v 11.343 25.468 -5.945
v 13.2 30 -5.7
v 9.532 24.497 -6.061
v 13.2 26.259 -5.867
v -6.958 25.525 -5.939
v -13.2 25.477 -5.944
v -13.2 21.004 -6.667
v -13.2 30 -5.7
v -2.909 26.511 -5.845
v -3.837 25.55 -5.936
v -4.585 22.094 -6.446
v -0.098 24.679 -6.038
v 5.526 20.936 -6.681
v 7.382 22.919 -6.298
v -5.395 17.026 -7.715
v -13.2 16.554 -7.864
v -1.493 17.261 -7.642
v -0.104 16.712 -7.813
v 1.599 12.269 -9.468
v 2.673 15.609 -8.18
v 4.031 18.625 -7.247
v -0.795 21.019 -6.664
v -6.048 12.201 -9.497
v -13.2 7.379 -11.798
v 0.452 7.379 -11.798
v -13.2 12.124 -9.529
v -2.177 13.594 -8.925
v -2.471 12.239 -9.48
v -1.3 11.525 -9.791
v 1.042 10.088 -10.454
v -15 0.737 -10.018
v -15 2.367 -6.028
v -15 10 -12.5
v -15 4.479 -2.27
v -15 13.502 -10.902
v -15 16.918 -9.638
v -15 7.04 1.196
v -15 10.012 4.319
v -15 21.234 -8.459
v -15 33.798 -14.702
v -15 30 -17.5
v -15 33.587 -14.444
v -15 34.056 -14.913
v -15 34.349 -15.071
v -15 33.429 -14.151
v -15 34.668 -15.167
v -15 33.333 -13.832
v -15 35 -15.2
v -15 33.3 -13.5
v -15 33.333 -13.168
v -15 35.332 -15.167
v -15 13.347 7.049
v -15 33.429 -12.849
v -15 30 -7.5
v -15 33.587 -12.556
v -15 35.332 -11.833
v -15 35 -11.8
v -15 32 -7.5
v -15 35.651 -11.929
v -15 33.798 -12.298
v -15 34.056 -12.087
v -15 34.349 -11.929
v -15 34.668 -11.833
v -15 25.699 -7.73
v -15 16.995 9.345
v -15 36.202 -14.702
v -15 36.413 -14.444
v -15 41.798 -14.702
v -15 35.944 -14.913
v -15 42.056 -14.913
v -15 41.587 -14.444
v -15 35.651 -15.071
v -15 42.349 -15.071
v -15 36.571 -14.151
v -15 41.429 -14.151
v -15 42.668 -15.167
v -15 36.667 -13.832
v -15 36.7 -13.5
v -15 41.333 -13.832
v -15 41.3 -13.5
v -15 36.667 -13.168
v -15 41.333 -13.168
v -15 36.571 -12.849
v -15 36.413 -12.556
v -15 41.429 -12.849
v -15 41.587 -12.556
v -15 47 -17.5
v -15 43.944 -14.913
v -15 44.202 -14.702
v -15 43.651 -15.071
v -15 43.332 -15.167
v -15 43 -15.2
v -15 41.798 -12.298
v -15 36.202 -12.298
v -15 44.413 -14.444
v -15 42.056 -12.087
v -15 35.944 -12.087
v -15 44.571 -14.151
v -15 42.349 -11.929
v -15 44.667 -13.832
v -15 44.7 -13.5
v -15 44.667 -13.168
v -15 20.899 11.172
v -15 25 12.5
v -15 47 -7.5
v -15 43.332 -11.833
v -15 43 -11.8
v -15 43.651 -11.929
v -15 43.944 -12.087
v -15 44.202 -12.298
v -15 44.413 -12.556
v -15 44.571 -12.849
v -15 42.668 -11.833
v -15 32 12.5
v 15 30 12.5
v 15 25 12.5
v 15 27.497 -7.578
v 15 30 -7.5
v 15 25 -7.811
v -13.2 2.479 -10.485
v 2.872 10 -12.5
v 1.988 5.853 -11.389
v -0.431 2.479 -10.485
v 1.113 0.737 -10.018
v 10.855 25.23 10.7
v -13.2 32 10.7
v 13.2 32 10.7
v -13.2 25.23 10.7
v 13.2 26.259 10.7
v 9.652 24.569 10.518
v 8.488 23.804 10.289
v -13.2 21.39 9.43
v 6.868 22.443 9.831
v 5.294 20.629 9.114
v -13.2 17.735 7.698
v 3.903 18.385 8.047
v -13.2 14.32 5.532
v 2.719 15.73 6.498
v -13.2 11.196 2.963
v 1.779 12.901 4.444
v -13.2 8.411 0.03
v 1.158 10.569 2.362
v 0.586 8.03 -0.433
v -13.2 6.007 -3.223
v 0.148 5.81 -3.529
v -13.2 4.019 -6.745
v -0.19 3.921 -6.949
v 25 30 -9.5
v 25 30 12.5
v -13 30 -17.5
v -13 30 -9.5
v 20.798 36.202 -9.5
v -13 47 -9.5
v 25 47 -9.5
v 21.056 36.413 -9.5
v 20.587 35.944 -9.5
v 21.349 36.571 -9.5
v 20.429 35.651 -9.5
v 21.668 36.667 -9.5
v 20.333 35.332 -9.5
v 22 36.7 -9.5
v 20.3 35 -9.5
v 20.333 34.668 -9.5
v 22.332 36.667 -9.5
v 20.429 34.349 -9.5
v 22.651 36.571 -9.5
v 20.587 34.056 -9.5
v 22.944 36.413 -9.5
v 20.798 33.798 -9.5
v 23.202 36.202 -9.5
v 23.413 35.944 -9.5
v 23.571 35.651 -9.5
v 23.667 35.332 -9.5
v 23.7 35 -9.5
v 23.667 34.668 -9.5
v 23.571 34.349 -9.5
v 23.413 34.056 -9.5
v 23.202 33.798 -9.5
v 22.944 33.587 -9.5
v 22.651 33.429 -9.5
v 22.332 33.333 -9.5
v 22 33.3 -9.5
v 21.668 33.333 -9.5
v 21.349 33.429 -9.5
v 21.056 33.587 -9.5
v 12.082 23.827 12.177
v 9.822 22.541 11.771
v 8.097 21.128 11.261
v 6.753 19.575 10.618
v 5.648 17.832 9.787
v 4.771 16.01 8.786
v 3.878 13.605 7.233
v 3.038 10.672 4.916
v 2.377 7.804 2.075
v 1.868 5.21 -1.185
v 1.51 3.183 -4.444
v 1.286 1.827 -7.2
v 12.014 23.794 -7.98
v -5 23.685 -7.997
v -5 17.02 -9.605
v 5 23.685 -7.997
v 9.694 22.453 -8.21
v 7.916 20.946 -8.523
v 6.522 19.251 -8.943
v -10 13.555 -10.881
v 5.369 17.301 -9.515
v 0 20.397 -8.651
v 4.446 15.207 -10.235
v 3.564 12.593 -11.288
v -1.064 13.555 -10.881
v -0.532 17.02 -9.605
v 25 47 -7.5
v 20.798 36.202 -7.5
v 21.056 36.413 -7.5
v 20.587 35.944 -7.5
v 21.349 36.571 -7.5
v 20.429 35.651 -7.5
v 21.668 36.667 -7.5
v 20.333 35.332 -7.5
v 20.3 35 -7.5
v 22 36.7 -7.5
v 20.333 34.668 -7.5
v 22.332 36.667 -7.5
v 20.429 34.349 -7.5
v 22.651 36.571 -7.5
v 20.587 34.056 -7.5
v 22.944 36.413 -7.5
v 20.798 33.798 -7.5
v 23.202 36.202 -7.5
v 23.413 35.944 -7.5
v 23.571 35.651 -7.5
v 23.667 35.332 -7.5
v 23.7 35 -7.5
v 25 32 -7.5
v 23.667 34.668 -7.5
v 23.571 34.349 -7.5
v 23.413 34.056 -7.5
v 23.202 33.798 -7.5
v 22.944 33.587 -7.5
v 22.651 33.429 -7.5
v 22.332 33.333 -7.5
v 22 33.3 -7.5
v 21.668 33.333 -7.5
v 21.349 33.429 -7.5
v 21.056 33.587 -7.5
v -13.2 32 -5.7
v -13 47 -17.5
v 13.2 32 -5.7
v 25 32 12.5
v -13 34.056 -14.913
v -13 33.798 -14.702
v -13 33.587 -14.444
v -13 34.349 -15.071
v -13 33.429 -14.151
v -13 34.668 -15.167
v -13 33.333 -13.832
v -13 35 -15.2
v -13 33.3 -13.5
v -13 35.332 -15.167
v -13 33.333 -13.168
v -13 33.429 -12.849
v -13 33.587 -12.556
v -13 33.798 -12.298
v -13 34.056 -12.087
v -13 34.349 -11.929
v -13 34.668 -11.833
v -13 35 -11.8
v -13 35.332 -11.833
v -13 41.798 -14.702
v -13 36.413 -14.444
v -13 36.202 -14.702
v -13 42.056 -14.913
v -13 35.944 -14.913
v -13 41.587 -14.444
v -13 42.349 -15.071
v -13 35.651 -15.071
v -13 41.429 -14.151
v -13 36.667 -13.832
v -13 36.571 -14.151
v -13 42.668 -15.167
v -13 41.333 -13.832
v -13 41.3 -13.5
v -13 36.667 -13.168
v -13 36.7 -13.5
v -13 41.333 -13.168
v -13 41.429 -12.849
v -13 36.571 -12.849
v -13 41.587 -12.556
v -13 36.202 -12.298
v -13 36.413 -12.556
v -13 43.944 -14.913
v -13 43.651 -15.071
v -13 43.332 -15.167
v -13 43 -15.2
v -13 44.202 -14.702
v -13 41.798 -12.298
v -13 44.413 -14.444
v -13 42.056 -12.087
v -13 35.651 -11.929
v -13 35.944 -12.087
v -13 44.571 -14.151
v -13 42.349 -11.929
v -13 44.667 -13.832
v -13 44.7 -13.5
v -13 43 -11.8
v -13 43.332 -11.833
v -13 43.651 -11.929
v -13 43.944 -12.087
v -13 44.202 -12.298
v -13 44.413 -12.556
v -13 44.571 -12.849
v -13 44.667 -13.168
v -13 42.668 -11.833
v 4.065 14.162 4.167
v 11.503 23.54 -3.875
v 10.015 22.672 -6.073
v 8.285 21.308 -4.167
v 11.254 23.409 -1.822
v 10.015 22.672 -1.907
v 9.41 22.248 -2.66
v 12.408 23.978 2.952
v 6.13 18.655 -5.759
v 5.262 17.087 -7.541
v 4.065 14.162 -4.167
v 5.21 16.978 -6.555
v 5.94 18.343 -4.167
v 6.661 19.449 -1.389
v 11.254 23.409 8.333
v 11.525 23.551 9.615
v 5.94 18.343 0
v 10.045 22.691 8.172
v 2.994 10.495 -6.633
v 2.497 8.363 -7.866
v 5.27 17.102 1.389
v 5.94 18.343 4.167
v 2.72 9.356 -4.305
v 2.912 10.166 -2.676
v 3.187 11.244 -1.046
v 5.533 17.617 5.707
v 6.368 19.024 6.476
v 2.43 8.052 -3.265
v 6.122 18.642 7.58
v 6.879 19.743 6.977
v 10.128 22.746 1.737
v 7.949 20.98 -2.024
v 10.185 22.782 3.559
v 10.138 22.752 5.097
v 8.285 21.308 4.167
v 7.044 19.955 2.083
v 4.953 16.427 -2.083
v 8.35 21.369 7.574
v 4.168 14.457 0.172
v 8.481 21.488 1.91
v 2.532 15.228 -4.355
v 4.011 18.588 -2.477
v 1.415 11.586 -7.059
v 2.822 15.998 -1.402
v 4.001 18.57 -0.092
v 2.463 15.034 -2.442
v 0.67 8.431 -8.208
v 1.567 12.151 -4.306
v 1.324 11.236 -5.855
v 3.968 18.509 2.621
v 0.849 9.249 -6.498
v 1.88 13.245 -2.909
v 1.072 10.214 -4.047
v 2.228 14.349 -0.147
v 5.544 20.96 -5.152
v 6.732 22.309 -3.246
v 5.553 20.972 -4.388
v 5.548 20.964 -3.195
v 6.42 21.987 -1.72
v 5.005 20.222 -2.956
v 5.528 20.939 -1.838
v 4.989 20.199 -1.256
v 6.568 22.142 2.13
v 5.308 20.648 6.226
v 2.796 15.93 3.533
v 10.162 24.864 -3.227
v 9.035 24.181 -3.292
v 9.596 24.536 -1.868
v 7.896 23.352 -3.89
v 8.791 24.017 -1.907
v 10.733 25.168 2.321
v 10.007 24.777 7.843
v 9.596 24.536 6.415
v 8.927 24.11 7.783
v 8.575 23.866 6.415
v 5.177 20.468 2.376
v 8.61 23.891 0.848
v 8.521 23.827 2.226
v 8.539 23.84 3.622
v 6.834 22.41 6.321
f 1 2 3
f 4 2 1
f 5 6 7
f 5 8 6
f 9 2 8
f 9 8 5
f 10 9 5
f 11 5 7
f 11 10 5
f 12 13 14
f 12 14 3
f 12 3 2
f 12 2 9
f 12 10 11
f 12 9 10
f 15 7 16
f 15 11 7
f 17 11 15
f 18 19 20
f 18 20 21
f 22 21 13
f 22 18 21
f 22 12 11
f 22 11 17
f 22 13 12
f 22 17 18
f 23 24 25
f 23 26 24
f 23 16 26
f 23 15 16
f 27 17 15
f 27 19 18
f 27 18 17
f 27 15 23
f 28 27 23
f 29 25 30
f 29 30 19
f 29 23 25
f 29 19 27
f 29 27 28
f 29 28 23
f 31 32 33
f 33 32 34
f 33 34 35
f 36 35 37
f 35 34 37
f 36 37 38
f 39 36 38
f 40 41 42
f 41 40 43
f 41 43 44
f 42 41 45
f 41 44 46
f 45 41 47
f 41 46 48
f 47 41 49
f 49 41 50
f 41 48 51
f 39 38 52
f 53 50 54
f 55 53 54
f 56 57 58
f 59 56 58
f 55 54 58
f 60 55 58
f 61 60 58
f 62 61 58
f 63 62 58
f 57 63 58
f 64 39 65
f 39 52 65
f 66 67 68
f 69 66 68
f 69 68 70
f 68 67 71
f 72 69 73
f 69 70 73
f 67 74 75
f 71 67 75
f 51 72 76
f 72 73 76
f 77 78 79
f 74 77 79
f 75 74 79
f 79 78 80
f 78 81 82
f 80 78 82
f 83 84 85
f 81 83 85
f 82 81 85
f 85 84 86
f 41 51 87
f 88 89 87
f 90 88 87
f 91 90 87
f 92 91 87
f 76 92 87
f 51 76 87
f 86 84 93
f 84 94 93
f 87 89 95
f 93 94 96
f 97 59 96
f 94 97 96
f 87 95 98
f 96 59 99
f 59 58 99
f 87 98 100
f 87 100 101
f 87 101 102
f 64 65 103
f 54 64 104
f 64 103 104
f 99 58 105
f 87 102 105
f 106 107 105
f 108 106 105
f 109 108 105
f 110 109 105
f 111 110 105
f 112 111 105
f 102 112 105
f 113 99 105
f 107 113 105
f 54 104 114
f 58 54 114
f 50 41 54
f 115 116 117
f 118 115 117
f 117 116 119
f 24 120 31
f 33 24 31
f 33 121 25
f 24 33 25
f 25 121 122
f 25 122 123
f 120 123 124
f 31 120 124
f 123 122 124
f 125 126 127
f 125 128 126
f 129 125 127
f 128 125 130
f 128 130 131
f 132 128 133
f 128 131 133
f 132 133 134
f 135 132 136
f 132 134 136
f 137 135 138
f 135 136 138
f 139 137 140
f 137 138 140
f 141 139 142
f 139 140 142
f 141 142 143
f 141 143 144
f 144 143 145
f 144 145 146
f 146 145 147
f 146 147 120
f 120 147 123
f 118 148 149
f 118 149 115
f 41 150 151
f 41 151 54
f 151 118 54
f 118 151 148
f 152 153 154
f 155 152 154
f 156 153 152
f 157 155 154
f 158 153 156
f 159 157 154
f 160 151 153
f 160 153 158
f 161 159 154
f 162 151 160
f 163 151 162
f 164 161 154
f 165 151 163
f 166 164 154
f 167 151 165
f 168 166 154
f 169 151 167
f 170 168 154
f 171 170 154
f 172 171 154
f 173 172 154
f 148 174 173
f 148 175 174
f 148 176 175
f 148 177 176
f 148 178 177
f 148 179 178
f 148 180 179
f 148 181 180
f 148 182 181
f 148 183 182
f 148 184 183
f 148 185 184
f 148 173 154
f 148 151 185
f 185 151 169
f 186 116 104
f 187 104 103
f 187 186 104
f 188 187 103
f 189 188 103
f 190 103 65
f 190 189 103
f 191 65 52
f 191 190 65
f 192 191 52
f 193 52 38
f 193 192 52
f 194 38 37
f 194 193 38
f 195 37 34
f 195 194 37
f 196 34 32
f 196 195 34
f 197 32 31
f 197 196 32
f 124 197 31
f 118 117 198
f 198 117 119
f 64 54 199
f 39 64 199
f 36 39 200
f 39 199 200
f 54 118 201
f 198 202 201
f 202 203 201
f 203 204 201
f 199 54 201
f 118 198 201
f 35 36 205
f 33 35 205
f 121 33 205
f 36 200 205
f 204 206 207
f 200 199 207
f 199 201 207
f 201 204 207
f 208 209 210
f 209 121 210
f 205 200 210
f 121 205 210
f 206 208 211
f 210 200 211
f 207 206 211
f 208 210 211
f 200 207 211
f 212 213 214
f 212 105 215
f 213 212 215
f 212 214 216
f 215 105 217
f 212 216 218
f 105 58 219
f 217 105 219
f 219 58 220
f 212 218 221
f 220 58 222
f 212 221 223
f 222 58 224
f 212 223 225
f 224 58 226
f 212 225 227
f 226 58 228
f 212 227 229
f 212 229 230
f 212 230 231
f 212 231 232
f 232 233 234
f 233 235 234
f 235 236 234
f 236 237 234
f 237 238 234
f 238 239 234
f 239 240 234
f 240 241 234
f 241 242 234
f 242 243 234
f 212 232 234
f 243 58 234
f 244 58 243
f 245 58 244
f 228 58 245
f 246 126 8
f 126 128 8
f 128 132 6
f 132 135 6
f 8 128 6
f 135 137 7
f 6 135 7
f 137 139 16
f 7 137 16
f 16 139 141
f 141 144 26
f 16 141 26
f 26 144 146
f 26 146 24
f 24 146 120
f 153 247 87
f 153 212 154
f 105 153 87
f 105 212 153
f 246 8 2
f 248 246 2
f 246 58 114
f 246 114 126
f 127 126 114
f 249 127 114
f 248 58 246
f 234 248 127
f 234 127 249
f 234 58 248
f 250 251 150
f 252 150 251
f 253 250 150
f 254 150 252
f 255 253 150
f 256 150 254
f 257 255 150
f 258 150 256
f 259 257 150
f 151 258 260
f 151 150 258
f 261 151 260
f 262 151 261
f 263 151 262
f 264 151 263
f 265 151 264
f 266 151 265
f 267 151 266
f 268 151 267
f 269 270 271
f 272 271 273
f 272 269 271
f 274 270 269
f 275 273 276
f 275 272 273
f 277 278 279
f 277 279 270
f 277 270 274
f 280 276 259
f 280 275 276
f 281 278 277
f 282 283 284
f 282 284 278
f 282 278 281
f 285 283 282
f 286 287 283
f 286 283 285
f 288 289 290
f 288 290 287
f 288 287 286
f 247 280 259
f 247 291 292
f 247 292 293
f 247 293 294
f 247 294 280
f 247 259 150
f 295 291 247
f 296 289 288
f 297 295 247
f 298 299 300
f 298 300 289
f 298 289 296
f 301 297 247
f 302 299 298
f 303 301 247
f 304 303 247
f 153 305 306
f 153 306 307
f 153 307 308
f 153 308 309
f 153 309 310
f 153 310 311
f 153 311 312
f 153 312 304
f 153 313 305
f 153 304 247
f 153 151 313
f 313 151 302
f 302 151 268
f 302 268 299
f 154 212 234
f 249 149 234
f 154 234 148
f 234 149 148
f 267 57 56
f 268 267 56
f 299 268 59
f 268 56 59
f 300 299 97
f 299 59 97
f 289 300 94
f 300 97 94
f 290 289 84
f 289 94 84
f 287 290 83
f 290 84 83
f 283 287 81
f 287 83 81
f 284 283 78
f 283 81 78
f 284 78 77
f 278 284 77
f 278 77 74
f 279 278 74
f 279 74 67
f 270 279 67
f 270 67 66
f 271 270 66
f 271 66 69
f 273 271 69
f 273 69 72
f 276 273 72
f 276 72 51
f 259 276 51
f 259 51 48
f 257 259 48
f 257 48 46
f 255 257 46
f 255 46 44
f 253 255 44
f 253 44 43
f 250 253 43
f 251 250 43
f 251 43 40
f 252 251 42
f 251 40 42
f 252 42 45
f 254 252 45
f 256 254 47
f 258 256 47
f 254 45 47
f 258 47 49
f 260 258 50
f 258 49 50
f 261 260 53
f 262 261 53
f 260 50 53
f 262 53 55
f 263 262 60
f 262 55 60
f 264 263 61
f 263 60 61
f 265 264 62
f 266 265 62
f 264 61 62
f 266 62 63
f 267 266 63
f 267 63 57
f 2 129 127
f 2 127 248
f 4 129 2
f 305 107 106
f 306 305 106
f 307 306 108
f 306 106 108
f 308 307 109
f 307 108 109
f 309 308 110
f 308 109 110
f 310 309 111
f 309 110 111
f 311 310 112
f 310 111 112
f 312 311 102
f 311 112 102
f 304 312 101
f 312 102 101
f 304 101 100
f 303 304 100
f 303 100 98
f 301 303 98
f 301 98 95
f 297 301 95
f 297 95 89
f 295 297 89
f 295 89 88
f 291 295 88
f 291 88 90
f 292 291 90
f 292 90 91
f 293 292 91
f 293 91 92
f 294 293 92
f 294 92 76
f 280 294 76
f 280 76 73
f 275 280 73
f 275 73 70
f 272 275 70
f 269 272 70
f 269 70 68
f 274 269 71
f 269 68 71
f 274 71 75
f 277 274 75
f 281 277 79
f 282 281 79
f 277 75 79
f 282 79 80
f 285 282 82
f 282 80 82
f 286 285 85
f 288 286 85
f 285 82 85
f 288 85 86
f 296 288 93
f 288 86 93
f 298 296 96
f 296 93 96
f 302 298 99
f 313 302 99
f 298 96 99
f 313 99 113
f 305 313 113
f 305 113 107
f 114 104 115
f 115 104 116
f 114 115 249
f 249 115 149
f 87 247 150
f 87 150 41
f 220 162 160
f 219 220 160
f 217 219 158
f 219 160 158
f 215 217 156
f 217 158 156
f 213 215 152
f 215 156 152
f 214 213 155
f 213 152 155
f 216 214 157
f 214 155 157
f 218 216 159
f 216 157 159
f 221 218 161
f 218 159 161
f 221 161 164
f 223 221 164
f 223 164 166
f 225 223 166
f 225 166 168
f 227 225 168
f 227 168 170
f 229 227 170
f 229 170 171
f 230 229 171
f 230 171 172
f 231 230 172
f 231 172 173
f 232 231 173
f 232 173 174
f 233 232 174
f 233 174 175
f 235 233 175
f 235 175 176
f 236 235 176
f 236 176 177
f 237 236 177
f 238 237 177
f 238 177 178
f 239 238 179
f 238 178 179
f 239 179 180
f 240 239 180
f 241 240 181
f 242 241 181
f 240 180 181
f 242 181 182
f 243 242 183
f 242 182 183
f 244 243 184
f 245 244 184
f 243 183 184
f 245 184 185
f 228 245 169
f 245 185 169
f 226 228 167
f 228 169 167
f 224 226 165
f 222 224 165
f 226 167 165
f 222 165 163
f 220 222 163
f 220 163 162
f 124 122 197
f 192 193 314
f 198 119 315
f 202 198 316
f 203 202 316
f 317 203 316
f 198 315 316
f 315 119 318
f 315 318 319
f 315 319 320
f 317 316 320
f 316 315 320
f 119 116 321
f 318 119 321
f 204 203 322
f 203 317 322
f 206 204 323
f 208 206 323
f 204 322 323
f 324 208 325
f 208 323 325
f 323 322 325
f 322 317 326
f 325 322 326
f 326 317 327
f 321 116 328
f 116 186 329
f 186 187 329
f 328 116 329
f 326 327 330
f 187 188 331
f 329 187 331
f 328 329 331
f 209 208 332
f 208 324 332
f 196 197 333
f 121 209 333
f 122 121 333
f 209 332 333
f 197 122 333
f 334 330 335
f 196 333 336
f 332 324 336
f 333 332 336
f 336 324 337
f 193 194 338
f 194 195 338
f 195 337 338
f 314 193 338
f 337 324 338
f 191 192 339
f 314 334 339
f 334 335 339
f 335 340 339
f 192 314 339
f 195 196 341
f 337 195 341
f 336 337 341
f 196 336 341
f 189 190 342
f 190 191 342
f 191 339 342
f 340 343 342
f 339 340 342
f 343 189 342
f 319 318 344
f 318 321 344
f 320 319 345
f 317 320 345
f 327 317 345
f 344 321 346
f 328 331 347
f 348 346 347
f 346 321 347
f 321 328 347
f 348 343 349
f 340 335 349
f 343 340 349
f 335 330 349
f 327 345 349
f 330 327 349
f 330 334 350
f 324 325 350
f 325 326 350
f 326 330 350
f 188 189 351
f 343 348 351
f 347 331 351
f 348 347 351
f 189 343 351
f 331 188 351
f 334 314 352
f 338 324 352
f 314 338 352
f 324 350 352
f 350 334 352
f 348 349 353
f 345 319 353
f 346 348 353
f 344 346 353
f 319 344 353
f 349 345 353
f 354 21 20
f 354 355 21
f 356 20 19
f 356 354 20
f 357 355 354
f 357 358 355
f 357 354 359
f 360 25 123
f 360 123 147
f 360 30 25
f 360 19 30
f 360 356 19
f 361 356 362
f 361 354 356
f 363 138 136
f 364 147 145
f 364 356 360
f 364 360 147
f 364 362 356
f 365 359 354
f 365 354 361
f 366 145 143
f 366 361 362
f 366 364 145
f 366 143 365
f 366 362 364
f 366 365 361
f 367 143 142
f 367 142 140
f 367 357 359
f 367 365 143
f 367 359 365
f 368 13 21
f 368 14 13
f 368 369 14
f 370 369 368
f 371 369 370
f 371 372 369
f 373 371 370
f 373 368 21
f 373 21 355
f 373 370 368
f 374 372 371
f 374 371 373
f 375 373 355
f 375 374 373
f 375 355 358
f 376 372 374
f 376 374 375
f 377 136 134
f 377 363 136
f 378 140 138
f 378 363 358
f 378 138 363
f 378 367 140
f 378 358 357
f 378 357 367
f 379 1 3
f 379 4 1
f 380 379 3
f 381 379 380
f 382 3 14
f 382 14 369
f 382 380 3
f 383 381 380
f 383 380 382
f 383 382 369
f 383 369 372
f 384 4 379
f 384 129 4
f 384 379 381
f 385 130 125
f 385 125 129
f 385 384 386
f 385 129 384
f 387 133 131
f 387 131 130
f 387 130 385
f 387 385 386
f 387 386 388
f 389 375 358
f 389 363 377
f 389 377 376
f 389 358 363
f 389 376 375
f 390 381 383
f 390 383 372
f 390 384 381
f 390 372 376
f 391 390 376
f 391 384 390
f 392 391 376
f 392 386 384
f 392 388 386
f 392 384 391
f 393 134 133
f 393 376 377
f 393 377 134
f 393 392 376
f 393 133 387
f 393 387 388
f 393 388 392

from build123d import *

# Parameters (mm, degrees)
SKETCH_1_W               = 30
SKETCH_1_H               = 25
EXTRUDE_1_DEPTH          = 30
CUT_EXTRUDE_START        = -25
CUT_EXTRUDE_1_DEPTH      = 25
CUT_EXTRUDE_START_2      = -30
CUT_EXTRUDE_2_DEPTH      = 30
CUT_EXTRUDE_3_DEPTH      = 45.229515196
CUT_EXTRUDE_3_DEPTH_BACK = 45.229515196
CUT_EXTRUDE_4_DEPTH      = 45.229515196
CUT_EXTRUDE_4_DEPTH_BACK = 45.229515196
SHELL_2_T                = -1.8
SKETCH_8_W               = 40
SKETCH_8_H               = 20
SKETCH_8_W_2             = 26.4
SKETCH_8_H_2             = 16.4
EXTRUDE_2_DEPTH          = 2
EXTRUDE_3_DEPTH          = 15
EXTRUDE_3_DEPTH_BACK     = 2
SKETCH_9_W               = 40
SKETCH_9_H               = 2
SKETCH_10_W              = 2
SKETCH_10_H              = 17
EXTRUDE_4_DEPTH          = 8
CUT_EXTRUDE_5_REACH      = 66.15
SKETCH_13_R              = 1.7
CUT_EXTRUDE_6_REACH      = 59.602
SKETCH_14_R              = 1.7


# Read off the part's stored shape, not the designer's step: 切除-拉伸1, 切除-拉伸2
with BuildPart() as part:
    # 草图1 → 凸台-拉伸1 (new body)
    with BuildSketch(Plane(origin=(0, 0, 0), x_dir=(1, 0, 0), z_dir=(0, 1, 0))):
        Rectangle(SKETCH_1_W, SKETCH_1_H)
    extrude(amount=EXTRUDE_1_DEPTH)

    # 切除-拉伸1 outline → 切除-拉伸1 (cut)
    with BuildSketch(Plane(origin=(0, 0, -12.5), x_dir=(-1, 0, 0), z_dir=(0, 0, -1)).offset(CUT_EXTRUDE_START)):
        with BuildLine():
            add(Edge.make_bspline(
                [(-15, 25), (-6.511377405, 22.051776189), (-3.763777339, 18.136586702), (-1, 0)],
                knots=[0, 0, 0, 0, 1, 1, 1, 1], degree=3))
            Line((-15, 25), (-15, 0))
            Line((-15, 0), (-1, 0))
        make_face()
    extrude(amount=CUT_EXTRUDE_1_DEPTH, mode=Mode.SUBTRACT)

    # 切除-拉伸2 outline → 切除-拉伸2 (cut)
    with BuildSketch(Plane.ZY.offset(15).offset(CUT_EXTRUDE_START_2)):
        with BuildLine():
            add(Edge.make_bspline(
                [(-7.5, 30), (-7.5, 23.858714032), (-8.903080152, 17.199411136), (-12.5, 10)],
                knots=[0, 0, 0, 0, 1, 1, 1, 1], degree=3))
            Line((-7.5, 30), (-12.5, 30))
            Line((-12.5, 30), (-12.5, 10))
        make_face()
    extrude(amount=CUT_EXTRUDE_2_DEPTH, mode=Mode.SUBTRACT)

    # 草图6 → 切除-拉伸3 (cut, two sides: drawn at the far end of the back side and taken through both)
    with BuildSketch(Plane.ZY.offset(15).offset(-CUT_EXTRUDE_3_DEPTH_BACK)):
        with BuildLine():
            Line((34.396469071, 110.338119425), (12.5, 25))
            ThreePointArc((12.5, 25), (3.420693976, 9.079306024), (-12.5, 0))
            Line((-12.5, 0), (-97.838119425, -21.896469071))
            Line((-97.838119425, -21.896469071), (26.757626769, -146.492215265))
            Line((26.757626769, -146.492215265), (158.992215265, -14.257626769))
            Line((158.992215265, -14.257626769), (34.396469071, 110.338119425))
        make_face()
    extrude(amount=CUT_EXTRUDE_3_DEPTH + CUT_EXTRUDE_3_DEPTH_BACK, mode=Mode.SUBTRACT)

    # 草图7 → 切除-拉伸4 (cut, two sides: drawn at the far end of the back side and taken through both)
    with BuildSketch(Plane.ZY.offset(15).offset(-CUT_EXTRUDE_4_DEPTH_BACK)):
        Polygon((-34.201614467, 90.991527796), (-12.5, 10), (-10.017865444, 0.736547724), (11.683749023, -80.254980072), (-150.299306569, -123.658209006), (-196.184670059, 47.588298863), align=None)
    extrude(amount=CUT_EXTRUDE_4_DEPTH + CUT_EXTRUDE_4_DEPTH_BACK, mode=Mode.SUBTRACT)

    # 抽壳2
    shell_2_openings = [part.faces().sort_by_distance(p)[0] for p in [
        (0, 30, 2.5),
        (-6.528277813, 5.44772403, -11.28022133),
    ]]
    offset(amount=SHELL_2_T, openings=shell_2_openings)

    # 草图8 → 凸台-拉伸2 (add)
    with BuildSketch(Plane(origin=(0, 30, 0), x_dir=(1, 0, 0), z_dir=(0, 1, 0))):
        with Locations((5, -2.5)):
            Rectangle(SKETCH_8_W, SKETCH_8_H)
        with Locations((0, -2.5)):
            Rectangle(SKETCH_8_W_2, SKETCH_8_H_2, mode=Mode.SUBTRACT)
    extrude(amount=EXTRUDE_2_DEPTH)

    # 草图9 → 凸台-拉伸3 (add, two sides: drawn at the far end of the back side and taken through both)
    with BuildSketch(Plane(origin=(0, 32, 0), x_dir=(1, 0, 0), z_dir=(0, 1, 0)).offset(-EXTRUDE_3_DEPTH_BACK)):
        with Locations((5, 8.5)):
            Rectangle(SKETCH_9_W, SKETCH_9_H)
    extrude(amount=EXTRUDE_3_DEPTH + EXTRUDE_3_DEPTH_BACK)

    # 草图10 → 凸台-拉伸4 (add)
    with BuildSketch(Plane(origin=(0, 0, -9.5), x_dir=(-1, 0, 0), z_dir=(0, 0, -1))):
        with Locations((14, 38.5)):
            Rectangle(SKETCH_10_W, SKETCH_10_H)
    extrude(amount=EXTRUDE_4_DEPTH)

    # 草图13 → 切除-拉伸5 (cut, up to next)
    with BuildSketch(Plane.ZY.offset(15), mode=Mode.PRIVATE) as cut_extrude_5_sk1:
        with Locations((-13.5, 43)):
            Circle(SKETCH_13_R)
    cut_extrude_5_tool1 = extrude(cut_extrude_5_sk1.sketch, amount=-CUT_EXTRUDE_5_REACH, mode=Mode.PRIVATE) & part.part
    # 草图13 → 切除-拉伸5 (cut, up to next)
    with BuildSketch(Plane.ZY.offset(15), mode=Mode.PRIVATE) as cut_extrude_5_sk2:
        with Locations((-13.5, 35)):
            Circle(SKETCH_13_R)
    cut_extrude_5_tool2 = extrude(cut_extrude_5_sk2.sketch, amount=-CUT_EXTRUDE_5_REACH, mode=Mode.PRIVATE) & part.part
    add(cut_extrude_5_tool1.solids().sort_by_distance((-15, 43, -13.5))[0], mode=Mode.SUBTRACT)
    add(cut_extrude_5_tool2.solids().sort_by_distance((-15, 35, -13.5))[0], mode=Mode.SUBTRACT)

    # 草图14 → 切除-拉伸6 (cut, up to next)
    with BuildSketch(Plane(origin=(0, 0, -9.5), x_dir=(-1, 0, 0), z_dir=(0, 0, -1)), mode=Mode.PRIVATE) as cut_extrude_6_sk1:
        with Locations((-22, 35)):
            Circle(SKETCH_14_R)
    cut_extrude_6_tool1 = extrude(cut_extrude_6_sk1.sketch, amount=-CUT_EXTRUDE_6_REACH, mode=Mode.PRIVATE) & part.part
    add(cut_extrude_6_tool1.solids().sort_by_distance((22, 35, -9.5))[0], mode=Mode.SUBTRACT)


solid = part.part
